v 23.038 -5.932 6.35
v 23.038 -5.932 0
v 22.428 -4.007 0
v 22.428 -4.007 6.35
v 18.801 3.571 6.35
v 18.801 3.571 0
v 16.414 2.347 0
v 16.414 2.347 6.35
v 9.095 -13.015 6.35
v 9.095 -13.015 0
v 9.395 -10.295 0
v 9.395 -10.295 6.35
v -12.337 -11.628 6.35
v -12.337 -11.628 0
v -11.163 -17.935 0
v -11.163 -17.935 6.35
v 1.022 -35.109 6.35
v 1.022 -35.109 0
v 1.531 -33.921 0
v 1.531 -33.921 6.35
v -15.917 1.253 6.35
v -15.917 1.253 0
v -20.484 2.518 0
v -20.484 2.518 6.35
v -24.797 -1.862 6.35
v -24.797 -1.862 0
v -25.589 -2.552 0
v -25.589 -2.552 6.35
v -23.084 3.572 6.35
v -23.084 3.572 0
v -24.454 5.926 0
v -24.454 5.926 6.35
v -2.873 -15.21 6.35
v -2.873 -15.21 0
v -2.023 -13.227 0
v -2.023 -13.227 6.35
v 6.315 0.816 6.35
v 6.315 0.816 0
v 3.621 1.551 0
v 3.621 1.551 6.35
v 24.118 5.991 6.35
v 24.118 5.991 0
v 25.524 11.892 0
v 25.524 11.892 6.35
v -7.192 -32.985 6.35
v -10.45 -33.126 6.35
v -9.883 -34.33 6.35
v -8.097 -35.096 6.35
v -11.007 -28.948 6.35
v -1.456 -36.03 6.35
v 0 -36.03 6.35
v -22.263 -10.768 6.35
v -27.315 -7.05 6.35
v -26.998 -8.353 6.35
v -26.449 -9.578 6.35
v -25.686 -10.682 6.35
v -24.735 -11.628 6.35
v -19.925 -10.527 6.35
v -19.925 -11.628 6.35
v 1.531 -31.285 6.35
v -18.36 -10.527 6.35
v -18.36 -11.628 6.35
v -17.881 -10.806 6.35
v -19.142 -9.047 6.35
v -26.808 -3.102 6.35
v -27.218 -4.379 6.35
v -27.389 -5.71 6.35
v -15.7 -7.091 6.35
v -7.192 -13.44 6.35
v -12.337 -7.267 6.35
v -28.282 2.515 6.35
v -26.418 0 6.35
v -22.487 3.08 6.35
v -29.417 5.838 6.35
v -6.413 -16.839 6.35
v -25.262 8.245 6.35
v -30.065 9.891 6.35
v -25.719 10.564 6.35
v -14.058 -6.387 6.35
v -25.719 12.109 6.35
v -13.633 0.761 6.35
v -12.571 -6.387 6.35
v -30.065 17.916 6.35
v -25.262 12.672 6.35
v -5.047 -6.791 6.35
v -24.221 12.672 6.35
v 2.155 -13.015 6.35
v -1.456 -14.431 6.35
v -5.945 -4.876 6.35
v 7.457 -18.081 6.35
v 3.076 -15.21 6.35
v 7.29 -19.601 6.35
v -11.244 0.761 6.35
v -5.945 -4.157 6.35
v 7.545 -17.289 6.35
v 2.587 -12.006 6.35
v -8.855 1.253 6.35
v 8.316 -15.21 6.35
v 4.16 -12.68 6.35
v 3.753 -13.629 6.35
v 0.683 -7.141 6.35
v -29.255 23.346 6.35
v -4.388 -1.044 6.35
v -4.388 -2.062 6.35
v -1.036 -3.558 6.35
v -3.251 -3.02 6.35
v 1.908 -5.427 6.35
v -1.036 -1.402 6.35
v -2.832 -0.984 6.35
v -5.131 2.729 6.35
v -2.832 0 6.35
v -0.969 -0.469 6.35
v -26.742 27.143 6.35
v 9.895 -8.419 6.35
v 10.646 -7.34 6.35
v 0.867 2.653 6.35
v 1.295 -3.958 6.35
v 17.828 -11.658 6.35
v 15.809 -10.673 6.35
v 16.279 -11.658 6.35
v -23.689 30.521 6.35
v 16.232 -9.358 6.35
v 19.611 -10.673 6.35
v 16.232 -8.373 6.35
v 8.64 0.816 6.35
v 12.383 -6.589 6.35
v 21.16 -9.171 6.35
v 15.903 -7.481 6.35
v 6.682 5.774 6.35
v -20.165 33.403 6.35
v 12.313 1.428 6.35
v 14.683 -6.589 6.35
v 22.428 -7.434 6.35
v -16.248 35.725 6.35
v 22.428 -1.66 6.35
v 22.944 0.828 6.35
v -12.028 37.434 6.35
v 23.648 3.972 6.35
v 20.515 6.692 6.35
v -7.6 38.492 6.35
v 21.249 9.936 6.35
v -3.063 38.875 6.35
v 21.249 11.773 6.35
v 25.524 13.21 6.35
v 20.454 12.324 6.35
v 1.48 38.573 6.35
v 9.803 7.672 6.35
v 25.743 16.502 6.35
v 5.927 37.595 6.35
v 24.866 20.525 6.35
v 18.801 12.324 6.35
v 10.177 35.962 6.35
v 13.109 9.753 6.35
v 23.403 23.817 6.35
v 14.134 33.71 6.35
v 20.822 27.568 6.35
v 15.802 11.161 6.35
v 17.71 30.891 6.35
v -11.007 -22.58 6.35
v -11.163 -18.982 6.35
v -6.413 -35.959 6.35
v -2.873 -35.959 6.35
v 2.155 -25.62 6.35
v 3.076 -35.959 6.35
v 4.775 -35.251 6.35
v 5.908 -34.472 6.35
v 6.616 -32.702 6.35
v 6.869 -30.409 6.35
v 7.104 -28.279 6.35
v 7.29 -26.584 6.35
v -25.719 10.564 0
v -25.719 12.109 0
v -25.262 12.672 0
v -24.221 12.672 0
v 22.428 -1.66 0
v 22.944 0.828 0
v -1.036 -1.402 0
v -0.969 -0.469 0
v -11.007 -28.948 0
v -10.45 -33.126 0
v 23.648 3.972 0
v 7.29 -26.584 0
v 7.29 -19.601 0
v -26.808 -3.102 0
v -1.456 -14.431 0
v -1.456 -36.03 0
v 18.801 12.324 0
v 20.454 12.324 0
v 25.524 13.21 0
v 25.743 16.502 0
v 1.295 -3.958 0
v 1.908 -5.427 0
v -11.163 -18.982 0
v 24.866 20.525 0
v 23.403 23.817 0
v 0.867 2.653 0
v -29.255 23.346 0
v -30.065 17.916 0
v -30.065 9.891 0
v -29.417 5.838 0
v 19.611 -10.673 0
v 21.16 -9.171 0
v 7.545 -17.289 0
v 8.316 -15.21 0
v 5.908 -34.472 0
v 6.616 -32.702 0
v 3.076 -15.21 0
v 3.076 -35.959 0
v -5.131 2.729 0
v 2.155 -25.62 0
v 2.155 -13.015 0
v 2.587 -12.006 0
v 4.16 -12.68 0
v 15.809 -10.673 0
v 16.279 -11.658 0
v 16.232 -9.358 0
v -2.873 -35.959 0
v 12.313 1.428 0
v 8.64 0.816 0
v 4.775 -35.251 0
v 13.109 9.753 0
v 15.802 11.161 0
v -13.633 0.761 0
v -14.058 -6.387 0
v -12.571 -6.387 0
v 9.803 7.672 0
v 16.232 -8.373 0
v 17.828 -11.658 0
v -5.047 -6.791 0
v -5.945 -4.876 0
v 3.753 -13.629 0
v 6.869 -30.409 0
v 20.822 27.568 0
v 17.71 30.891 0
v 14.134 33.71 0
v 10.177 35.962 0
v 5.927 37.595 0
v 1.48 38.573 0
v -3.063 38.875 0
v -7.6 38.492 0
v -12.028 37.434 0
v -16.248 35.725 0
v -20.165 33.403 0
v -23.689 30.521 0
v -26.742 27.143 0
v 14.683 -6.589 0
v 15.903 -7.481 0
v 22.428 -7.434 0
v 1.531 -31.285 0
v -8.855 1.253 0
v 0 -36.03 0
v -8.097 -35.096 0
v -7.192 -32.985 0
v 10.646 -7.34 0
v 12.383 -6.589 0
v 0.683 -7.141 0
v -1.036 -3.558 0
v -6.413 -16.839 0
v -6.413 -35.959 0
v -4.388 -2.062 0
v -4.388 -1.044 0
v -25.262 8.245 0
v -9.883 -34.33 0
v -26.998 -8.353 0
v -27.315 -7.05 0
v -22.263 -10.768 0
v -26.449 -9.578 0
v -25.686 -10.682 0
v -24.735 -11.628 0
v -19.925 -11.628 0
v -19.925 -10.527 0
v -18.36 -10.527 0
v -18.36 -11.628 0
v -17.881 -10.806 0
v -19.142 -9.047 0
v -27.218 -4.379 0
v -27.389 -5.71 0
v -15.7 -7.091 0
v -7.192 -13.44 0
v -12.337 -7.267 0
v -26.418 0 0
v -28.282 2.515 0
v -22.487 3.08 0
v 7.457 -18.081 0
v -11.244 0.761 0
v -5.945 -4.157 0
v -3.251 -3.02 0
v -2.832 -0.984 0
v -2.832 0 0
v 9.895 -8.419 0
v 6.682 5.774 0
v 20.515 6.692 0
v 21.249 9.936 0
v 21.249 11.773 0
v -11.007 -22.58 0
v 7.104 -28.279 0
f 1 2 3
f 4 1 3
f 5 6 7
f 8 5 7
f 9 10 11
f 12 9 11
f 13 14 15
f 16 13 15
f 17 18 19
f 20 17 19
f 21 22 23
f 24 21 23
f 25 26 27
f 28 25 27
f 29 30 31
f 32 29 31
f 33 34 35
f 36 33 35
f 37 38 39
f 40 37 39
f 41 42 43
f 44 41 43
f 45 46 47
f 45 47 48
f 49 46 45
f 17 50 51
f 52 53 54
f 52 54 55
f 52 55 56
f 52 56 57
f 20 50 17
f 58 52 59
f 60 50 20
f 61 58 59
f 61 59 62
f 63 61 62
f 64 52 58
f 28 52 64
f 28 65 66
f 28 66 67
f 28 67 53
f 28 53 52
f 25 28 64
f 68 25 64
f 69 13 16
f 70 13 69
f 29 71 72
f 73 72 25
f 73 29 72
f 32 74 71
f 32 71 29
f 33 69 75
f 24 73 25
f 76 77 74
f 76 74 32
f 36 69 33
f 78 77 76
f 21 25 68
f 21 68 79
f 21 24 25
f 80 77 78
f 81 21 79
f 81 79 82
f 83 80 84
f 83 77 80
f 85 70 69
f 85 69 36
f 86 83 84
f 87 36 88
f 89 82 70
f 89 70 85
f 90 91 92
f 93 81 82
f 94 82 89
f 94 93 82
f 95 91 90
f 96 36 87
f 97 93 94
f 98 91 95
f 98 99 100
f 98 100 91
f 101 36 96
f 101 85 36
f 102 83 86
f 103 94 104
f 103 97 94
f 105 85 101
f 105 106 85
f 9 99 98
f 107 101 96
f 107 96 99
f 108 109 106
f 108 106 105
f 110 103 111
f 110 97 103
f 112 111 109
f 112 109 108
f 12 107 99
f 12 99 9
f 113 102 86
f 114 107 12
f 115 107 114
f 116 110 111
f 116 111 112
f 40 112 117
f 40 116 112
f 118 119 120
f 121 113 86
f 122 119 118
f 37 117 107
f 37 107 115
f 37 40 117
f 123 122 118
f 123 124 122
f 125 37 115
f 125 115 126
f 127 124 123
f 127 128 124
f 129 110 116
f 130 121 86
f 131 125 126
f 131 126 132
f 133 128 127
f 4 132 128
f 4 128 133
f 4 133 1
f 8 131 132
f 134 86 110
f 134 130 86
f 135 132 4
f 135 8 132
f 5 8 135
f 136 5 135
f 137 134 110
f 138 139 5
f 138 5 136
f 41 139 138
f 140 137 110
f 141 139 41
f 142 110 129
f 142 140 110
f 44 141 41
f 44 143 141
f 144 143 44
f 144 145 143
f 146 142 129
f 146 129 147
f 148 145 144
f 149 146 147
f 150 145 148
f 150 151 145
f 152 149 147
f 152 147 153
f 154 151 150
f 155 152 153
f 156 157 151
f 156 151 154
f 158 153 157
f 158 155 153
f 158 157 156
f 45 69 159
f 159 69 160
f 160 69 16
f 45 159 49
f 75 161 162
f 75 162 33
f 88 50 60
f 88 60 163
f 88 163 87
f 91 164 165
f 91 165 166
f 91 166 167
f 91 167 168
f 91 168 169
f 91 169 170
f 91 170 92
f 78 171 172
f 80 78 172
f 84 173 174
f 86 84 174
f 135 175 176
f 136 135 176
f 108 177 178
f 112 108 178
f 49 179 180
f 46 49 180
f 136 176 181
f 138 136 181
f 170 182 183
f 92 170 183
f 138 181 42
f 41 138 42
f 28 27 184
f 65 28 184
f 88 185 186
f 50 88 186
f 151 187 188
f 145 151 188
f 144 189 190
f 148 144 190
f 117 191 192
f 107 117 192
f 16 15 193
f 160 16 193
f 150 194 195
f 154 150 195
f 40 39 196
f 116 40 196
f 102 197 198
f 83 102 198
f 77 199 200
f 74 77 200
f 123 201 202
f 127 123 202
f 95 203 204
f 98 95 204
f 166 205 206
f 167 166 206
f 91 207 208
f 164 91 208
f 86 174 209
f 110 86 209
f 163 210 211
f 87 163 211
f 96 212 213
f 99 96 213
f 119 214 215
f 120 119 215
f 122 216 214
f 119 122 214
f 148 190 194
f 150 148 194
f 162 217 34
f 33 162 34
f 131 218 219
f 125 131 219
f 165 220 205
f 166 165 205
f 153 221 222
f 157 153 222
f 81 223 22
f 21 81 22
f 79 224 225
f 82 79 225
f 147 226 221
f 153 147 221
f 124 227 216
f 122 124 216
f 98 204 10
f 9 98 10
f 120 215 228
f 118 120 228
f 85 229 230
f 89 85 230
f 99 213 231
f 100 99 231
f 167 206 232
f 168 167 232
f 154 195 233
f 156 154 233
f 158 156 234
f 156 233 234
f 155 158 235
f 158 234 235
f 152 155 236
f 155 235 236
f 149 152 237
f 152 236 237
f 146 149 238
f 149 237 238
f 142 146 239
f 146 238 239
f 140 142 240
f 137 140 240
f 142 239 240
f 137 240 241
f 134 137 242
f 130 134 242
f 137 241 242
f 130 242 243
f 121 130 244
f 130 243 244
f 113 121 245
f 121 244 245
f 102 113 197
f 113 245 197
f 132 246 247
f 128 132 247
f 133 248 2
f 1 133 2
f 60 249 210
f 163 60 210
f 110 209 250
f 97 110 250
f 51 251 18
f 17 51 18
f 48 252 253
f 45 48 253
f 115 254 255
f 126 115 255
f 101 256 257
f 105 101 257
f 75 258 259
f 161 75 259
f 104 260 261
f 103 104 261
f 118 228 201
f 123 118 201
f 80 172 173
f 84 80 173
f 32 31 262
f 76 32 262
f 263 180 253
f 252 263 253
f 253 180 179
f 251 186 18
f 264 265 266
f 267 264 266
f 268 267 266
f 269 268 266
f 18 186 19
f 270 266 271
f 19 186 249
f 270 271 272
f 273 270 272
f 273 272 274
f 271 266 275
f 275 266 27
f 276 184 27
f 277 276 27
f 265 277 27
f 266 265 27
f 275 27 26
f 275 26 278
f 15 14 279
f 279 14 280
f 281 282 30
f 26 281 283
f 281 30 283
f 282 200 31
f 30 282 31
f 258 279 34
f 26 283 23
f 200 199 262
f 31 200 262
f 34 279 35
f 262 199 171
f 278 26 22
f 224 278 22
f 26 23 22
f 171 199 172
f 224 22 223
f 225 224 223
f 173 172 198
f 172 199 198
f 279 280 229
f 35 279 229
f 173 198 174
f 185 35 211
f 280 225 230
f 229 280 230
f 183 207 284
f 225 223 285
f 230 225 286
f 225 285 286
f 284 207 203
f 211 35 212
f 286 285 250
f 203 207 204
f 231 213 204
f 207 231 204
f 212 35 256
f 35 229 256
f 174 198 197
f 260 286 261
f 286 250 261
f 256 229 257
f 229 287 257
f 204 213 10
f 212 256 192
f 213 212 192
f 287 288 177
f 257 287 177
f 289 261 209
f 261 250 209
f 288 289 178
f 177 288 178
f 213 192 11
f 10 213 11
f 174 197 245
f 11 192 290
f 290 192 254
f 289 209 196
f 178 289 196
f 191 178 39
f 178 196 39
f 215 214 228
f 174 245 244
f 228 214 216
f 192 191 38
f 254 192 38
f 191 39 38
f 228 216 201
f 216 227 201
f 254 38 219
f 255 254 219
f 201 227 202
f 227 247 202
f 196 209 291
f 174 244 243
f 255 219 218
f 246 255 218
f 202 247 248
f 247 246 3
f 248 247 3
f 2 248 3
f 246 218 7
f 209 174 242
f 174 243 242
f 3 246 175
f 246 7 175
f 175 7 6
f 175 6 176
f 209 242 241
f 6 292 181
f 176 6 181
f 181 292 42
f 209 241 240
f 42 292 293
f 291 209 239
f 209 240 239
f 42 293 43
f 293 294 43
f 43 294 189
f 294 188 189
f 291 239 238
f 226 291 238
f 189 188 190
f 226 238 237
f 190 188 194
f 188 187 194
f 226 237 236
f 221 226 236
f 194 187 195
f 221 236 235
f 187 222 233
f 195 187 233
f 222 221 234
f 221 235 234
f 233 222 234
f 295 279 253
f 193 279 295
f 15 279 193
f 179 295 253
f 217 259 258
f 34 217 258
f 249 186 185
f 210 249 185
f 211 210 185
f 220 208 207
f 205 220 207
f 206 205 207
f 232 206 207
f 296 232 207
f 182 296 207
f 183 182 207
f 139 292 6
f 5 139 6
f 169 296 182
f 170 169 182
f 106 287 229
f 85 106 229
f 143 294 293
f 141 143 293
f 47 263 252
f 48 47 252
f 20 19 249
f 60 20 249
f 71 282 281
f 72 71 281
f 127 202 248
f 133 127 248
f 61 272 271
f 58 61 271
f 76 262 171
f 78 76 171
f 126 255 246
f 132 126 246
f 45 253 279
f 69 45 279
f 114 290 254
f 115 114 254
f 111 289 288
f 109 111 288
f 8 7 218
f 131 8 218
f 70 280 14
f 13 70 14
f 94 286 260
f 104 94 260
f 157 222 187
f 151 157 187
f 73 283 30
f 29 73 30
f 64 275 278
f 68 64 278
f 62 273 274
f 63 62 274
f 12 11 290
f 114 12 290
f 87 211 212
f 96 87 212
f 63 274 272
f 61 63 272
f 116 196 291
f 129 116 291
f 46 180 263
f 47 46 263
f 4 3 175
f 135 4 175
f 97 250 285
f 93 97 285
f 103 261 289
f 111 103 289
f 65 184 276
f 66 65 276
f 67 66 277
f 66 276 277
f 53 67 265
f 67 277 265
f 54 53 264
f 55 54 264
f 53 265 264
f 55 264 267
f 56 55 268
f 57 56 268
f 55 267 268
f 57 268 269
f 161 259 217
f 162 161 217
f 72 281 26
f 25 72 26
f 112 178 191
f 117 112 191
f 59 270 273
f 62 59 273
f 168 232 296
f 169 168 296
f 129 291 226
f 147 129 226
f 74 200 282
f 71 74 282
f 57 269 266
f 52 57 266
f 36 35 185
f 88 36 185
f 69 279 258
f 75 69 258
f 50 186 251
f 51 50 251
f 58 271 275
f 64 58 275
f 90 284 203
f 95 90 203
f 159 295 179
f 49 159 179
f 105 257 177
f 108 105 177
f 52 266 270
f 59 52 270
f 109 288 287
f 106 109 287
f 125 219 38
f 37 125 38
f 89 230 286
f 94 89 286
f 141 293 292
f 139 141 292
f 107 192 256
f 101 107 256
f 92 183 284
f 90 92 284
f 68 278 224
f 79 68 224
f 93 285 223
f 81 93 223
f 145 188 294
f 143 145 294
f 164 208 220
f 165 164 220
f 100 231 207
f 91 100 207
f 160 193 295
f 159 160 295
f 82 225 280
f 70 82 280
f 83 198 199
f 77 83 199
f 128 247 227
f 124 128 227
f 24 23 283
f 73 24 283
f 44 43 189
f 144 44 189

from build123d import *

# Parameters (mm, degrees)
F1_DEPTH = 6.35


with BuildPart() as f1:
    # F0 (on Top) → F1 (new body)
    with BuildSketch(Plane.XY):
        with BuildLine():
            ThreePointArc((23.402542, 23.817074), (-3.062865, 38.874712), (-29.25491, 23.346445))
            Line((-29.25491, 23.346445), (-30.065471, 17.915688))
            Line((-30.065471, 17.915688), (-30.065471, 15.159781))
            Line((-30.065471, 15.159781), (-30.065471, 12.403875))
            Line((-30.065471, 12.403875), (-30.065471, 9.891136))
            Line((-30.065471, 9.891136), (-29.417021, 5.838332))
            Line((-29.417021, 5.838332), (-28.282236, 2.515032))
            Line((-28.282236, 2.515032), (-26.417948, 0))
            Line((-26.417948, 0), (-24.796825, -1.861996))
            Line((-24.796825, -1.861996), (-25.589179, -2.551849))
            Line((-25.589179, -2.551849), (-26.808415, -3.101752))
            ThreePointArc((-26.808415, -3.101752), (-27.185988, -7.708848), (-24.735437, -11.628375))
            Line((-24.735437, -11.628375), (-22.263491, -10.76789))
            Line((-22.263491, -10.76789), (-19.924534, -11.628375))
            Line((-19.924534, -11.628375), (-18.360017, -11.628375))
            Line((-18.360017, -11.628375), (-17.880529, -10.806396))
            Line((-17.880529, -10.806396), (-18.360017, -10.526695))
            Line((-18.360017, -10.526695), (-19.924534, -10.526695))
            Line((-19.924534, -10.526695), (-19.142276, -9.046921))
            Line((-19.142276, -9.046921), (-15.700337, -7.091273))
            Line((-15.700337, -7.091273), (-14.057593, -6.38724))
            Line((-14.057593, -6.38724), (-12.5713, -6.38724))
            Line((-12.5713, -6.38724), (-12.336623, -7.267281))
            Line((-12.336623, -7.267281), (-12.336623, -11.628375))
            Line((-12.336623, -11.628375), (-11.163235, -17.93534))
            Line((-11.163235, -17.93534), (-11.163235, -18.981609))
            Line((-11.163235, -18.981609), (-11.006783, -22.580002))
            Line((-11.006783, -22.580002), (-11.006783, -24.692101))
            Line((-11.006783, -24.692101), (-11.006783, -28.948328))
            Line((-11.006783, -28.948328), (-10.449933, -33.126414))
            Line((-10.449933, -33.126414), (-9.883413, -34.330271))
            Line((-9.883413, -34.330271), (-8.097164, -35.095806))
            Line((-8.097164, -35.095806), (-7.192442, -32.984786))
            Line((-7.192442, -32.984786), (-7.192442, -30.364629))
            Line((-7.192442, -30.364629), (-7.192442, -26.682248))
            Line((-7.192442, -26.682248), (-7.192442, -22.999866))
            Line((-7.192442, -22.999866), (-7.192442, -19.388299))
            Line((-7.192442, -19.388299), (-7.192442, -13.439838))
            Line((-7.192442, -13.439838), (-6.413477, -16.838958))
            Line((-6.413477, -16.838958), (-6.413477, -20.521341))
            Line((-6.413477, -20.521341), (-6.413477, -24.557797))
            Line((-6.413477, -24.557797), (-6.413477, -28.806698))
            Line((-6.413477, -28.806698), (-6.413477, -34.542717))
            Line((-6.413477, -34.542717), (-6.413477, -35.959017))
            Line((-6.413477, -35.959017), (-2.872725, -35.959017))
            Line((-2.872725, -35.959017), (-2.872725, -15.210214))
            Line((-2.872725, -15.210214), (-2.022945, -13.227393))
            Line((-2.022945, -13.227393), (-1.456425, -14.431247))
            Line((-1.456425, -14.431247), (-1.456425, -16.484883))
            Line((-1.456425, -16.484883), (-1.456425, -21.158677))
            Line((-1.456425, -21.158677), (-1.456425, -36.029831))
            Line((-1.456425, -36.029831), (0, -36.029831))
            Line((0, -36.029831), (1.022101, -35.109237))
            Line((1.022101, -35.109237), (1.531237, -33.921254))
            Line((1.531237, -33.921254), (1.531237, -31.285223))
            Line((1.531237, -31.285223), (2.155141, -25.620023))
            Line((2.155141, -25.620023), (2.155141, -20.662971))
            Line((2.155141, -20.662971), (2.155141, -16.484883))
            Line((2.155141, -16.484883), (2.155141, -13.014947))
            Line((2.155141, -13.014947), (2.587357, -12.006444))
            Line((2.587357, -12.006444), (4.159939, -12.680407))
            Line((4.159939, -12.680407), (3.753364, -13.629085))
            Line((3.753364, -13.629085), (3.075737, -15.210214))
            Line((3.075737, -15.210214), (3.075737, -17.26385))
            Line((3.075737, -17.26385), (3.075737, -35.959017))
            Line((3.075737, -35.959017), (4.775298, -35.250865))
            Line((4.775298, -35.250865), (5.908338, -34.471899))
            Line((5.908338, -34.471899), (6.616489, -32.701526))
            Line((6.616489, -32.701526), (6.869, -30.408662))
            Line((6.869, -30.408662), (7.103555, -28.278847))
            Line((7.103555, -28.278847), (7.290181, -26.584241))
            Line((7.290181, -26.584241), (7.290181, -24.203721))
            Line((7.290181, -24.203721), (7.290181, -21.866826))
            Line((7.290181, -21.866826), (7.290181, -19.600745))
            Line((7.290181, -19.600745), (7.457498, -18.081469))
            Line((7.457498, -18.081469), (7.544803, -17.288722))
            Line((7.544803, -17.288722), (8.316048, -15.210214))
            Line((8.316048, -15.210214), (9.095014, -13.014947))
            Line((9.095014, -13.014947), (9.394606, -10.294581))
            Line((9.394606, -10.294581), (9.895026, -8.41949))
            Line((9.895026, -8.41949), (10.646053, -7.339889))
            Line((10.646053, -7.339889), (12.382803, -6.588862))
            Line((12.382803, -6.588862), (14.682825, -6.588862))
            Line((14.682825, -6.588862), (15.903244, -7.480707))
            Line((15.903244, -7.480707), (16.231818, -8.372552))
            Line((16.231818, -8.372552), (16.231818, -9.358275))
            Line((16.231818, -9.358275), (15.809365, -10.672572))
            Line((15.809365, -10.672572), (16.278757, -11.658295))
            Line((16.278757, -11.658295), (17.076723, -11.658295))
            Line((17.076723, -11.658295), (17.827751, -11.658295))
            Line((17.827751, -11.658295), (19.611441, -10.672572))
            Line((19.611441, -10.672572), (21.160433, -9.170517))
            Line((21.160433, -9.170517), (22.427792, -7.433767))
            Line((22.427792, -7.433767), (23.038002, -5.931713))
            Line((23.038002, -5.931713), (22.427792, -4.007206))
            Line((22.427792, -4.007206), (22.427792, -1.660245))
            Line((22.427792, -1.660245), (22.944123, 0.827532))
            Line((22.944123, 0.827532), (23.648212, 3.972458))
            Line((23.648212, 3.972458), (24.117604, 5.990844))
            Line((24.117604, 5.990844), (25.523951, 11.89182))
            Line((25.523951, 11.89182), (25.523951, 13.210032))
            Line((25.523951, 13.210032), (25.74341, 16.501874))
            Line((25.74341, 16.501874), (24.865583, 20.525234))
            Line((24.865583, 20.525234), (23.402542, 23.817074))
        make_face()
        Polygon((-3.250899, -3.01964), (-5.046938, -6.791321), (-5.944957, -4.875546), (-5.944957, -4.157131), (-4.388391, -2.061753), (-4.388391, -1.043998), (-2.831824, 0), (-2.831824, -0.98413), align=None, mode=Mode.SUBTRACT)
        Polygon((-1.035786, -1.402149), (-0.969216, -0.468996), (1.295493, -3.957871), (1.907576, -5.426871), (0.68341, -7.140704), (-1.035786, -3.558452), align=None, mode=Mode.SUBTRACT)
        Polygon((-24.221089, 12.671578), (-5.1312, 2.728927), (-8.855303, 1.25334), (-11.244349, 0.761477), (-13.633396, 0.761477), (-15.917044, 1.25334), (-20.484339, 2.518129), (-22.486921, 3.080258), (-23.084182, 3.57212), (-24.454372, 5.926034), (-25.262432, 8.244814), (-25.71916, 10.563594), (-25.71916, 12.109448), (-25.262432, 12.671578), align=None, mode=Mode.SUBTRACT)
        Polygon((3.62141, 1.55088), (0.867034, 2.65263), (6.681826, 5.774255), (9.803452, 7.671713), (13.108702, 9.752797), (15.801869, 11.160589), (18.801078, 12.323546), (20.453703, 12.323546), (21.249412, 11.772673), (21.249412, 9.936422), (20.514911, 6.69238), (18.801078, 3.570755), (16.413951, 2.346588), (12.312994, 1.428463), (8.640493, 0.816379), (6.314577, 0.816379), align=None, mode=Mode.SUBTRACT)
    extrude(amount=F1_DEPTH)


solid = f1.part
